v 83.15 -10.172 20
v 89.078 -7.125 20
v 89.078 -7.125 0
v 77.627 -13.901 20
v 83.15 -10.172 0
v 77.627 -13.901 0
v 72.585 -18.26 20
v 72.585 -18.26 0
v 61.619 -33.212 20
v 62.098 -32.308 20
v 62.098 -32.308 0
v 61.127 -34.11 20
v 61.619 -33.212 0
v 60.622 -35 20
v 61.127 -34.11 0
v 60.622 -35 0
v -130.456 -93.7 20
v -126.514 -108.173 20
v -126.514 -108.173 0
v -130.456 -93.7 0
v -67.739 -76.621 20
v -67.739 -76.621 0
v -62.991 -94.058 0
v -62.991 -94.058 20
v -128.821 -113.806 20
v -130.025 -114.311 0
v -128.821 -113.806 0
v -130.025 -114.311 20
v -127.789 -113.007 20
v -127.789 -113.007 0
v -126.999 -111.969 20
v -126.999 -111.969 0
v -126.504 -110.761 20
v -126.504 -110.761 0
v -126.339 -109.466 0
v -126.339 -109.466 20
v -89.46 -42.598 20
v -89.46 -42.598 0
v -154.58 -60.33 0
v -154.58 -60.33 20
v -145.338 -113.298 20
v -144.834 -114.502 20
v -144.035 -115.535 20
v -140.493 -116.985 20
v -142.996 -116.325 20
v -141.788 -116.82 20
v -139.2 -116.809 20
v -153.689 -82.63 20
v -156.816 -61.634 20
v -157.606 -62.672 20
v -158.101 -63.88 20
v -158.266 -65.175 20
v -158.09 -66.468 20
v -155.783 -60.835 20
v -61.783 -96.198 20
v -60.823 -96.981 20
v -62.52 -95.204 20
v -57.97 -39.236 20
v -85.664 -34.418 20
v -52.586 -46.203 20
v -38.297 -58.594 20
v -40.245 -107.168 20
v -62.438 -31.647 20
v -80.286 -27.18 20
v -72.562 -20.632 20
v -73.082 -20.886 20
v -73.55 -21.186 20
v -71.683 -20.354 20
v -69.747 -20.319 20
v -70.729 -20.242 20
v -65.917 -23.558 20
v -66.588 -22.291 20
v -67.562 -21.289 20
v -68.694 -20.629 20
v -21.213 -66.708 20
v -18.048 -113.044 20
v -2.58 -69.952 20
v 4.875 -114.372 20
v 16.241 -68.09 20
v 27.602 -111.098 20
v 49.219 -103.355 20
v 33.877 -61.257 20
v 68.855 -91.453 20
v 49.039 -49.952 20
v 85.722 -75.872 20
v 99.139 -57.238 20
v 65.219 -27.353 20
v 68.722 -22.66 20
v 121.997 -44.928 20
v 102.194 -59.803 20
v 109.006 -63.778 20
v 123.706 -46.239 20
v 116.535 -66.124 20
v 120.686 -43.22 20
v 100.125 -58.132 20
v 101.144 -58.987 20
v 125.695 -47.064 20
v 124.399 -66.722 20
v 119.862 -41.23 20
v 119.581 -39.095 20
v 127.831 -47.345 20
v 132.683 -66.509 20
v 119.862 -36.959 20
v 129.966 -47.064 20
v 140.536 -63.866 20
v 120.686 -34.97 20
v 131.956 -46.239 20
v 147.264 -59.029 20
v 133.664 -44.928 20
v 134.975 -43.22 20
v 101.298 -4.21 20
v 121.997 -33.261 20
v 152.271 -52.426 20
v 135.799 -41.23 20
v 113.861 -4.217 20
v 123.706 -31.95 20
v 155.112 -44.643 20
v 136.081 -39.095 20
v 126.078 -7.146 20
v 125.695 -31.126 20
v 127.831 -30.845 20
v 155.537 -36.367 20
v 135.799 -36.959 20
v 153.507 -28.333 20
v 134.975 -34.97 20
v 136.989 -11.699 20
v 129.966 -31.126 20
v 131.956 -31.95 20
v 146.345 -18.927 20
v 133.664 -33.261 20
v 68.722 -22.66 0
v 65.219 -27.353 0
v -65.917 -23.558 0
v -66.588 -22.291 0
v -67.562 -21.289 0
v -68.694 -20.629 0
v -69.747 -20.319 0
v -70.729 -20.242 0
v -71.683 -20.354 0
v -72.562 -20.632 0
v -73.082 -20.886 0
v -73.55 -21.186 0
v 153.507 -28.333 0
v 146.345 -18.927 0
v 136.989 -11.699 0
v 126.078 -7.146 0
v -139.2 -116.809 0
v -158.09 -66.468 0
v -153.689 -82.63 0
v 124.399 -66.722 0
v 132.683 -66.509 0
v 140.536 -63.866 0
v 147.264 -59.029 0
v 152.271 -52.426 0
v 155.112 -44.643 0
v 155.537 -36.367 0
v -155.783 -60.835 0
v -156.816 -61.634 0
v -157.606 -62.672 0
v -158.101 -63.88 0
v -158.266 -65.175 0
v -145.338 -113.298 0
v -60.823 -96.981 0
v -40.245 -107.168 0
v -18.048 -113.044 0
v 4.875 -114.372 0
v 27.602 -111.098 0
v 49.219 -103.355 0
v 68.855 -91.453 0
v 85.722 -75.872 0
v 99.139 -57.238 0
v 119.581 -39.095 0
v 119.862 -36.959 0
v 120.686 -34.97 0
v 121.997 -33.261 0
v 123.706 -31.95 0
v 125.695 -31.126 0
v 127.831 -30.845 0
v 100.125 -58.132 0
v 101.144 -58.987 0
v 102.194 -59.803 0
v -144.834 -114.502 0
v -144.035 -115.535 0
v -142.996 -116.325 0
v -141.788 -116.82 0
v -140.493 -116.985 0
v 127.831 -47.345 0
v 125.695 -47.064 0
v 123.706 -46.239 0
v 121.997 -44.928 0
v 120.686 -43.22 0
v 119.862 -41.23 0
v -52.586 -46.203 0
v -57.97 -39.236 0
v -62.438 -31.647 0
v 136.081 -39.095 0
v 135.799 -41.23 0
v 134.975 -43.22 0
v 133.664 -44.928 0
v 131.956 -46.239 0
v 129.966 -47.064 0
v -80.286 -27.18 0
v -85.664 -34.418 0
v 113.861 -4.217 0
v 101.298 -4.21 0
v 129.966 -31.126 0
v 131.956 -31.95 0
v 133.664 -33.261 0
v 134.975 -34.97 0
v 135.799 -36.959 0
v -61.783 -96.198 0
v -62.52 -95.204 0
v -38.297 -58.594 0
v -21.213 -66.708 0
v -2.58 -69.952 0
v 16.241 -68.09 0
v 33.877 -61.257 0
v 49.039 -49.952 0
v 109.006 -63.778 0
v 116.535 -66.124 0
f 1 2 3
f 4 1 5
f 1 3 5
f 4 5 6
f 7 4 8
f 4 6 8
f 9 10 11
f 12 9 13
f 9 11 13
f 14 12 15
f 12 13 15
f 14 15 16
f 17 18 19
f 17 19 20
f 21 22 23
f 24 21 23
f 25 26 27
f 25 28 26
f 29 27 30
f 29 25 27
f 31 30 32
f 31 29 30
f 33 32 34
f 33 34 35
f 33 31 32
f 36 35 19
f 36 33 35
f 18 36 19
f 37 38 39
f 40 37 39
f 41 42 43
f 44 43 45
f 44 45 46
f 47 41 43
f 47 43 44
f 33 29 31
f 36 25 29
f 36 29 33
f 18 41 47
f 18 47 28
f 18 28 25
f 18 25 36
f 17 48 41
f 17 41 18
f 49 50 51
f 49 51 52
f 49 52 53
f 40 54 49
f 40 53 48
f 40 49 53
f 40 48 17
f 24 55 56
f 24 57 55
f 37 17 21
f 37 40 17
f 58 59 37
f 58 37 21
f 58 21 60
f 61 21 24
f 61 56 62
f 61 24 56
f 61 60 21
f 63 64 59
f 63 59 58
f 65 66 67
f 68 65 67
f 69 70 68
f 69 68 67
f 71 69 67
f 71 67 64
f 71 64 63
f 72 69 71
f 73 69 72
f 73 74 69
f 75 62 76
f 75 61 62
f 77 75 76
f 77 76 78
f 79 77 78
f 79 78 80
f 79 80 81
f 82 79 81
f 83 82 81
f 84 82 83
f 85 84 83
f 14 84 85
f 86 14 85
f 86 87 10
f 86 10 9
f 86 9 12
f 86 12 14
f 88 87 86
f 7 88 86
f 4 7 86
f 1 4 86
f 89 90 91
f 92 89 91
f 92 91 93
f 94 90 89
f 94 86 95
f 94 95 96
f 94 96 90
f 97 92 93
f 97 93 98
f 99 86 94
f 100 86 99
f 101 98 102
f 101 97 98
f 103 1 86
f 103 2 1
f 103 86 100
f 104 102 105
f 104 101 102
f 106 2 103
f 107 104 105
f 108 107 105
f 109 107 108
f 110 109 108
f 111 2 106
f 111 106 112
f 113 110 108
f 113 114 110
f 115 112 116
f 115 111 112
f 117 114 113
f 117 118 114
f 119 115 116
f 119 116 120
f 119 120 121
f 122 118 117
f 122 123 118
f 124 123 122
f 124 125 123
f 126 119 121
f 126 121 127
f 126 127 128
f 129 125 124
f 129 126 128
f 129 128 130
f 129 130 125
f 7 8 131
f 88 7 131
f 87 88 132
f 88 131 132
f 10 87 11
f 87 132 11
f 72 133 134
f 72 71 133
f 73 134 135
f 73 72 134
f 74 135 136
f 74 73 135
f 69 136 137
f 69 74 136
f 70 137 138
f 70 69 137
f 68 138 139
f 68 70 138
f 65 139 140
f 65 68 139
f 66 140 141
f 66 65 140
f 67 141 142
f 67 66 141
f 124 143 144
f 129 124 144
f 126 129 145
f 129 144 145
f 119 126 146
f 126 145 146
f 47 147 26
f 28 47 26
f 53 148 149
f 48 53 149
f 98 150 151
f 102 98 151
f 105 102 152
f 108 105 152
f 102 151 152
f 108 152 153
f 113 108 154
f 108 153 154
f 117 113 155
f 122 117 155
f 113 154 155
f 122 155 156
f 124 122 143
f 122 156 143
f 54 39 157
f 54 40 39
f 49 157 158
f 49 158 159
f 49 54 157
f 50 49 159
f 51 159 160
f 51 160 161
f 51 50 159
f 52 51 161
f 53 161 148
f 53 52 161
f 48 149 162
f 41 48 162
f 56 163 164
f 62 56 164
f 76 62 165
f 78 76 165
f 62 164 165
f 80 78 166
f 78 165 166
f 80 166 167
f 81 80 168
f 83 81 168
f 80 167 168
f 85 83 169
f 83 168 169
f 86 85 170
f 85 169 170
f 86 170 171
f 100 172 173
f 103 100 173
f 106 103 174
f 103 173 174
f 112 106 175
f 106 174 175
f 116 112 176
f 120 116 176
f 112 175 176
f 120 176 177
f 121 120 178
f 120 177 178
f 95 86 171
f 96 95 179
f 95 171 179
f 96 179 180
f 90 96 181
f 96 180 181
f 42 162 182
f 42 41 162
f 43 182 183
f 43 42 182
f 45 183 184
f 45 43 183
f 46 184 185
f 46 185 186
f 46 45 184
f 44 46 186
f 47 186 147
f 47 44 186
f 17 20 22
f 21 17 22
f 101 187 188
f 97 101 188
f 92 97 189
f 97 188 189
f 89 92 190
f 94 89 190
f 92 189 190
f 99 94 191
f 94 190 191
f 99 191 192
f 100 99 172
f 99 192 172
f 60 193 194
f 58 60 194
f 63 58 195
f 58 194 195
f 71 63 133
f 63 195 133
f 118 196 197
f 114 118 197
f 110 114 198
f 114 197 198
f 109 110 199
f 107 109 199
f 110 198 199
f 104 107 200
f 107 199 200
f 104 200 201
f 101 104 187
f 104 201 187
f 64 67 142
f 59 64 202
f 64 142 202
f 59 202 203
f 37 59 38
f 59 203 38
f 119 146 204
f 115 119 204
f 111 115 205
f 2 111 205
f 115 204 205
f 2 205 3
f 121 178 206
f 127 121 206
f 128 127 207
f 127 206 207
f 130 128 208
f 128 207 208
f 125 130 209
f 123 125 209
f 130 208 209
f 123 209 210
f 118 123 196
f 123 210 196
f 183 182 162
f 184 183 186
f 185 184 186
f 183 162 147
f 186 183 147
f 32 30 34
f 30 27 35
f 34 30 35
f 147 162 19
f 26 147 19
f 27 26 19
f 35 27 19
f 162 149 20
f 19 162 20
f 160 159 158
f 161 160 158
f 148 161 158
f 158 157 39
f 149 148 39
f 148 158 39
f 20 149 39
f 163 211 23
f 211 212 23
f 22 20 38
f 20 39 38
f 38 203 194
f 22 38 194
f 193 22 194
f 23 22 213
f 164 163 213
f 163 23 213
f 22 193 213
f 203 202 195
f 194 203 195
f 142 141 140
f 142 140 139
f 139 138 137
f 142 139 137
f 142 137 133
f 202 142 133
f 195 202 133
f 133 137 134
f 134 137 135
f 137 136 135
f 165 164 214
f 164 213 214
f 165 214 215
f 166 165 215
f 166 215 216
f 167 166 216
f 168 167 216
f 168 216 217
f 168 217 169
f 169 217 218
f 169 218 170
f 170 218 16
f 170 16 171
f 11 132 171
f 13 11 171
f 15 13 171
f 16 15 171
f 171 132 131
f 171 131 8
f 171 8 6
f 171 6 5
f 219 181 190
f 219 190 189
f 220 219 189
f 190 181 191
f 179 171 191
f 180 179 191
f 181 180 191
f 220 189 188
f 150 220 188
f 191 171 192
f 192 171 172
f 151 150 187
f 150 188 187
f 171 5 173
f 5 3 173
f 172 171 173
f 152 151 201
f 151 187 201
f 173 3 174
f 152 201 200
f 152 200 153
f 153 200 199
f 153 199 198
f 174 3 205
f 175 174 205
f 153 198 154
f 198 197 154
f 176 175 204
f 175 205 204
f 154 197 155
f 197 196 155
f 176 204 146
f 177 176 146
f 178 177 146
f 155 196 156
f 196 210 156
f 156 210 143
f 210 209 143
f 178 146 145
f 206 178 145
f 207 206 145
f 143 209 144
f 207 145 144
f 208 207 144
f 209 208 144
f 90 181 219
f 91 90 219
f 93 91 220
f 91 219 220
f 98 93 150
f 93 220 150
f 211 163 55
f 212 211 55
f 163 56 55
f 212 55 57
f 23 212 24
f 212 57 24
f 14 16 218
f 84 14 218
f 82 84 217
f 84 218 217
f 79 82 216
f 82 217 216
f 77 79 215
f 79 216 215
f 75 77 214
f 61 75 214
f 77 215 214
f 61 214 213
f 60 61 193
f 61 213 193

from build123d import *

# Parameters (mm, degrees)
F1_DEPTH = 20
F2_R     = 5


with BuildPart() as f1:
    # F0 (on Top) → F1 (new body)
    with BuildSketch(Plane.XY):
        with BuildLine():
            ThreePointArc((62.0982979234, -32.3079153616), (61.3748002428, -33.6620542326), (60.6217782649, -35))
            ThreePointArc((60.6217782649, -35), (6.8935156521, -69.6597404672), (-52.585942091, -46.2030160747))
            ThreePointArc((-52.585942091, -46.2030160747), (-61.8348543065, -32.8093095462), (-67.7404726567, -17.6416655747))
            ThreePointArc((-67.7404726567, -17.6416655747), (-81.0257847056, -28.0086868154), (-89.4600211499, -42.5976655747))
            Line((-89.4600211499, -42.5976655747), (-159.4039528531, -61.6441383078))
            Line((-159.4039528531, -61.6441383078), (-153.6893015355, -82.6299232912))
            Line((-153.6893015355, -82.6299232912), (-144.0242180926, -118.1227909579))
            Line((-144.0242180926, -118.1227909579), (-125.2007401483, -112.996958728))
            Line((-125.2007401483, -112.996958728), (-130.4556035369, -93.6996425735))
            Line((-130.4556035369, -93.6996425735), (-67.7393260347, -76.6213365607))
            Line((-67.7393260347, -76.6213365607), (-62.4844626461, -95.9186527152))
            ThreePointArc((-62.4844626461, -95.9186527152), (26.6446559229, -111.3317489381), (99.1389025971, -57.2378721016))
            ThreePointArc((99.1389025971, -57.2378721016), (100.6299921675, -58.5640955368), (102.1943456774, -59.8030526802))
            ThreePointArc((102.1943456774, -59.8030526802), (112.7042159478, -65.1639931789), (124.3990139715, -66.7224396218))
            ThreePointArc((124.3990139715, -66.7224396218), (150.0146795525, -55.9152425647), (153.506587349, -28.3332844884))
            ThreePointArc((153.506587349, -28.3332844884), (141.9040424388, -15.0057333176), (126.0781092152, -7.1455484467))
            ThreePointArc((126.0781092152, -7.1455484467), (107.5798665118, -3.8447724044), (89.0780140303, -7.1252541295))
            ThreePointArc((89.0780140303, -7.1252541295), (80.333002866, -11.9541917196), (72.5849125327, -18.2598205304))
            ThreePointArc((72.5849125327, -18.2598205304), (66.9238294882, -24.9720069264), (62.0982979234, -32.3079153616))
        make_face()
        with BuildLine():
            ThreePointArc((127.83052, -30.8446834837), (133.6641509448, -33.2610525389), (136.08052, -39.0946834837))
            ThreePointArc((136.08052, -39.0946834837), (133.6641509448, -44.9283144285), (127.83052, -47.3446834837))
            ThreePointArc((127.83052, -47.3446834837), (121.9968890552, -44.9283144285), (119.58052, -39.0946834837))
            ThreePointArc((119.58052, -39.0946834837), (121.9968890552, -33.2610525389), (127.83052, -30.8446834837))
        make_face(mode=Mode.SUBTRACT)
    extrude(amount=F1_DEPTH)

    # F2
    f2_edges = [f1.edges().sort_by_distance(p)[0] for p in [
        (-67.740473, -17.641666, 10),
        (-159.403953, -61.644138, 10),
        (-144.024218, -118.122791, 10),
        (-125.20074, -112.996959, 10),
        (-62.484463, -95.918653, 10),
    ]]
    fillet(f2_edges, radius=F2_R)


solid = f1.part
